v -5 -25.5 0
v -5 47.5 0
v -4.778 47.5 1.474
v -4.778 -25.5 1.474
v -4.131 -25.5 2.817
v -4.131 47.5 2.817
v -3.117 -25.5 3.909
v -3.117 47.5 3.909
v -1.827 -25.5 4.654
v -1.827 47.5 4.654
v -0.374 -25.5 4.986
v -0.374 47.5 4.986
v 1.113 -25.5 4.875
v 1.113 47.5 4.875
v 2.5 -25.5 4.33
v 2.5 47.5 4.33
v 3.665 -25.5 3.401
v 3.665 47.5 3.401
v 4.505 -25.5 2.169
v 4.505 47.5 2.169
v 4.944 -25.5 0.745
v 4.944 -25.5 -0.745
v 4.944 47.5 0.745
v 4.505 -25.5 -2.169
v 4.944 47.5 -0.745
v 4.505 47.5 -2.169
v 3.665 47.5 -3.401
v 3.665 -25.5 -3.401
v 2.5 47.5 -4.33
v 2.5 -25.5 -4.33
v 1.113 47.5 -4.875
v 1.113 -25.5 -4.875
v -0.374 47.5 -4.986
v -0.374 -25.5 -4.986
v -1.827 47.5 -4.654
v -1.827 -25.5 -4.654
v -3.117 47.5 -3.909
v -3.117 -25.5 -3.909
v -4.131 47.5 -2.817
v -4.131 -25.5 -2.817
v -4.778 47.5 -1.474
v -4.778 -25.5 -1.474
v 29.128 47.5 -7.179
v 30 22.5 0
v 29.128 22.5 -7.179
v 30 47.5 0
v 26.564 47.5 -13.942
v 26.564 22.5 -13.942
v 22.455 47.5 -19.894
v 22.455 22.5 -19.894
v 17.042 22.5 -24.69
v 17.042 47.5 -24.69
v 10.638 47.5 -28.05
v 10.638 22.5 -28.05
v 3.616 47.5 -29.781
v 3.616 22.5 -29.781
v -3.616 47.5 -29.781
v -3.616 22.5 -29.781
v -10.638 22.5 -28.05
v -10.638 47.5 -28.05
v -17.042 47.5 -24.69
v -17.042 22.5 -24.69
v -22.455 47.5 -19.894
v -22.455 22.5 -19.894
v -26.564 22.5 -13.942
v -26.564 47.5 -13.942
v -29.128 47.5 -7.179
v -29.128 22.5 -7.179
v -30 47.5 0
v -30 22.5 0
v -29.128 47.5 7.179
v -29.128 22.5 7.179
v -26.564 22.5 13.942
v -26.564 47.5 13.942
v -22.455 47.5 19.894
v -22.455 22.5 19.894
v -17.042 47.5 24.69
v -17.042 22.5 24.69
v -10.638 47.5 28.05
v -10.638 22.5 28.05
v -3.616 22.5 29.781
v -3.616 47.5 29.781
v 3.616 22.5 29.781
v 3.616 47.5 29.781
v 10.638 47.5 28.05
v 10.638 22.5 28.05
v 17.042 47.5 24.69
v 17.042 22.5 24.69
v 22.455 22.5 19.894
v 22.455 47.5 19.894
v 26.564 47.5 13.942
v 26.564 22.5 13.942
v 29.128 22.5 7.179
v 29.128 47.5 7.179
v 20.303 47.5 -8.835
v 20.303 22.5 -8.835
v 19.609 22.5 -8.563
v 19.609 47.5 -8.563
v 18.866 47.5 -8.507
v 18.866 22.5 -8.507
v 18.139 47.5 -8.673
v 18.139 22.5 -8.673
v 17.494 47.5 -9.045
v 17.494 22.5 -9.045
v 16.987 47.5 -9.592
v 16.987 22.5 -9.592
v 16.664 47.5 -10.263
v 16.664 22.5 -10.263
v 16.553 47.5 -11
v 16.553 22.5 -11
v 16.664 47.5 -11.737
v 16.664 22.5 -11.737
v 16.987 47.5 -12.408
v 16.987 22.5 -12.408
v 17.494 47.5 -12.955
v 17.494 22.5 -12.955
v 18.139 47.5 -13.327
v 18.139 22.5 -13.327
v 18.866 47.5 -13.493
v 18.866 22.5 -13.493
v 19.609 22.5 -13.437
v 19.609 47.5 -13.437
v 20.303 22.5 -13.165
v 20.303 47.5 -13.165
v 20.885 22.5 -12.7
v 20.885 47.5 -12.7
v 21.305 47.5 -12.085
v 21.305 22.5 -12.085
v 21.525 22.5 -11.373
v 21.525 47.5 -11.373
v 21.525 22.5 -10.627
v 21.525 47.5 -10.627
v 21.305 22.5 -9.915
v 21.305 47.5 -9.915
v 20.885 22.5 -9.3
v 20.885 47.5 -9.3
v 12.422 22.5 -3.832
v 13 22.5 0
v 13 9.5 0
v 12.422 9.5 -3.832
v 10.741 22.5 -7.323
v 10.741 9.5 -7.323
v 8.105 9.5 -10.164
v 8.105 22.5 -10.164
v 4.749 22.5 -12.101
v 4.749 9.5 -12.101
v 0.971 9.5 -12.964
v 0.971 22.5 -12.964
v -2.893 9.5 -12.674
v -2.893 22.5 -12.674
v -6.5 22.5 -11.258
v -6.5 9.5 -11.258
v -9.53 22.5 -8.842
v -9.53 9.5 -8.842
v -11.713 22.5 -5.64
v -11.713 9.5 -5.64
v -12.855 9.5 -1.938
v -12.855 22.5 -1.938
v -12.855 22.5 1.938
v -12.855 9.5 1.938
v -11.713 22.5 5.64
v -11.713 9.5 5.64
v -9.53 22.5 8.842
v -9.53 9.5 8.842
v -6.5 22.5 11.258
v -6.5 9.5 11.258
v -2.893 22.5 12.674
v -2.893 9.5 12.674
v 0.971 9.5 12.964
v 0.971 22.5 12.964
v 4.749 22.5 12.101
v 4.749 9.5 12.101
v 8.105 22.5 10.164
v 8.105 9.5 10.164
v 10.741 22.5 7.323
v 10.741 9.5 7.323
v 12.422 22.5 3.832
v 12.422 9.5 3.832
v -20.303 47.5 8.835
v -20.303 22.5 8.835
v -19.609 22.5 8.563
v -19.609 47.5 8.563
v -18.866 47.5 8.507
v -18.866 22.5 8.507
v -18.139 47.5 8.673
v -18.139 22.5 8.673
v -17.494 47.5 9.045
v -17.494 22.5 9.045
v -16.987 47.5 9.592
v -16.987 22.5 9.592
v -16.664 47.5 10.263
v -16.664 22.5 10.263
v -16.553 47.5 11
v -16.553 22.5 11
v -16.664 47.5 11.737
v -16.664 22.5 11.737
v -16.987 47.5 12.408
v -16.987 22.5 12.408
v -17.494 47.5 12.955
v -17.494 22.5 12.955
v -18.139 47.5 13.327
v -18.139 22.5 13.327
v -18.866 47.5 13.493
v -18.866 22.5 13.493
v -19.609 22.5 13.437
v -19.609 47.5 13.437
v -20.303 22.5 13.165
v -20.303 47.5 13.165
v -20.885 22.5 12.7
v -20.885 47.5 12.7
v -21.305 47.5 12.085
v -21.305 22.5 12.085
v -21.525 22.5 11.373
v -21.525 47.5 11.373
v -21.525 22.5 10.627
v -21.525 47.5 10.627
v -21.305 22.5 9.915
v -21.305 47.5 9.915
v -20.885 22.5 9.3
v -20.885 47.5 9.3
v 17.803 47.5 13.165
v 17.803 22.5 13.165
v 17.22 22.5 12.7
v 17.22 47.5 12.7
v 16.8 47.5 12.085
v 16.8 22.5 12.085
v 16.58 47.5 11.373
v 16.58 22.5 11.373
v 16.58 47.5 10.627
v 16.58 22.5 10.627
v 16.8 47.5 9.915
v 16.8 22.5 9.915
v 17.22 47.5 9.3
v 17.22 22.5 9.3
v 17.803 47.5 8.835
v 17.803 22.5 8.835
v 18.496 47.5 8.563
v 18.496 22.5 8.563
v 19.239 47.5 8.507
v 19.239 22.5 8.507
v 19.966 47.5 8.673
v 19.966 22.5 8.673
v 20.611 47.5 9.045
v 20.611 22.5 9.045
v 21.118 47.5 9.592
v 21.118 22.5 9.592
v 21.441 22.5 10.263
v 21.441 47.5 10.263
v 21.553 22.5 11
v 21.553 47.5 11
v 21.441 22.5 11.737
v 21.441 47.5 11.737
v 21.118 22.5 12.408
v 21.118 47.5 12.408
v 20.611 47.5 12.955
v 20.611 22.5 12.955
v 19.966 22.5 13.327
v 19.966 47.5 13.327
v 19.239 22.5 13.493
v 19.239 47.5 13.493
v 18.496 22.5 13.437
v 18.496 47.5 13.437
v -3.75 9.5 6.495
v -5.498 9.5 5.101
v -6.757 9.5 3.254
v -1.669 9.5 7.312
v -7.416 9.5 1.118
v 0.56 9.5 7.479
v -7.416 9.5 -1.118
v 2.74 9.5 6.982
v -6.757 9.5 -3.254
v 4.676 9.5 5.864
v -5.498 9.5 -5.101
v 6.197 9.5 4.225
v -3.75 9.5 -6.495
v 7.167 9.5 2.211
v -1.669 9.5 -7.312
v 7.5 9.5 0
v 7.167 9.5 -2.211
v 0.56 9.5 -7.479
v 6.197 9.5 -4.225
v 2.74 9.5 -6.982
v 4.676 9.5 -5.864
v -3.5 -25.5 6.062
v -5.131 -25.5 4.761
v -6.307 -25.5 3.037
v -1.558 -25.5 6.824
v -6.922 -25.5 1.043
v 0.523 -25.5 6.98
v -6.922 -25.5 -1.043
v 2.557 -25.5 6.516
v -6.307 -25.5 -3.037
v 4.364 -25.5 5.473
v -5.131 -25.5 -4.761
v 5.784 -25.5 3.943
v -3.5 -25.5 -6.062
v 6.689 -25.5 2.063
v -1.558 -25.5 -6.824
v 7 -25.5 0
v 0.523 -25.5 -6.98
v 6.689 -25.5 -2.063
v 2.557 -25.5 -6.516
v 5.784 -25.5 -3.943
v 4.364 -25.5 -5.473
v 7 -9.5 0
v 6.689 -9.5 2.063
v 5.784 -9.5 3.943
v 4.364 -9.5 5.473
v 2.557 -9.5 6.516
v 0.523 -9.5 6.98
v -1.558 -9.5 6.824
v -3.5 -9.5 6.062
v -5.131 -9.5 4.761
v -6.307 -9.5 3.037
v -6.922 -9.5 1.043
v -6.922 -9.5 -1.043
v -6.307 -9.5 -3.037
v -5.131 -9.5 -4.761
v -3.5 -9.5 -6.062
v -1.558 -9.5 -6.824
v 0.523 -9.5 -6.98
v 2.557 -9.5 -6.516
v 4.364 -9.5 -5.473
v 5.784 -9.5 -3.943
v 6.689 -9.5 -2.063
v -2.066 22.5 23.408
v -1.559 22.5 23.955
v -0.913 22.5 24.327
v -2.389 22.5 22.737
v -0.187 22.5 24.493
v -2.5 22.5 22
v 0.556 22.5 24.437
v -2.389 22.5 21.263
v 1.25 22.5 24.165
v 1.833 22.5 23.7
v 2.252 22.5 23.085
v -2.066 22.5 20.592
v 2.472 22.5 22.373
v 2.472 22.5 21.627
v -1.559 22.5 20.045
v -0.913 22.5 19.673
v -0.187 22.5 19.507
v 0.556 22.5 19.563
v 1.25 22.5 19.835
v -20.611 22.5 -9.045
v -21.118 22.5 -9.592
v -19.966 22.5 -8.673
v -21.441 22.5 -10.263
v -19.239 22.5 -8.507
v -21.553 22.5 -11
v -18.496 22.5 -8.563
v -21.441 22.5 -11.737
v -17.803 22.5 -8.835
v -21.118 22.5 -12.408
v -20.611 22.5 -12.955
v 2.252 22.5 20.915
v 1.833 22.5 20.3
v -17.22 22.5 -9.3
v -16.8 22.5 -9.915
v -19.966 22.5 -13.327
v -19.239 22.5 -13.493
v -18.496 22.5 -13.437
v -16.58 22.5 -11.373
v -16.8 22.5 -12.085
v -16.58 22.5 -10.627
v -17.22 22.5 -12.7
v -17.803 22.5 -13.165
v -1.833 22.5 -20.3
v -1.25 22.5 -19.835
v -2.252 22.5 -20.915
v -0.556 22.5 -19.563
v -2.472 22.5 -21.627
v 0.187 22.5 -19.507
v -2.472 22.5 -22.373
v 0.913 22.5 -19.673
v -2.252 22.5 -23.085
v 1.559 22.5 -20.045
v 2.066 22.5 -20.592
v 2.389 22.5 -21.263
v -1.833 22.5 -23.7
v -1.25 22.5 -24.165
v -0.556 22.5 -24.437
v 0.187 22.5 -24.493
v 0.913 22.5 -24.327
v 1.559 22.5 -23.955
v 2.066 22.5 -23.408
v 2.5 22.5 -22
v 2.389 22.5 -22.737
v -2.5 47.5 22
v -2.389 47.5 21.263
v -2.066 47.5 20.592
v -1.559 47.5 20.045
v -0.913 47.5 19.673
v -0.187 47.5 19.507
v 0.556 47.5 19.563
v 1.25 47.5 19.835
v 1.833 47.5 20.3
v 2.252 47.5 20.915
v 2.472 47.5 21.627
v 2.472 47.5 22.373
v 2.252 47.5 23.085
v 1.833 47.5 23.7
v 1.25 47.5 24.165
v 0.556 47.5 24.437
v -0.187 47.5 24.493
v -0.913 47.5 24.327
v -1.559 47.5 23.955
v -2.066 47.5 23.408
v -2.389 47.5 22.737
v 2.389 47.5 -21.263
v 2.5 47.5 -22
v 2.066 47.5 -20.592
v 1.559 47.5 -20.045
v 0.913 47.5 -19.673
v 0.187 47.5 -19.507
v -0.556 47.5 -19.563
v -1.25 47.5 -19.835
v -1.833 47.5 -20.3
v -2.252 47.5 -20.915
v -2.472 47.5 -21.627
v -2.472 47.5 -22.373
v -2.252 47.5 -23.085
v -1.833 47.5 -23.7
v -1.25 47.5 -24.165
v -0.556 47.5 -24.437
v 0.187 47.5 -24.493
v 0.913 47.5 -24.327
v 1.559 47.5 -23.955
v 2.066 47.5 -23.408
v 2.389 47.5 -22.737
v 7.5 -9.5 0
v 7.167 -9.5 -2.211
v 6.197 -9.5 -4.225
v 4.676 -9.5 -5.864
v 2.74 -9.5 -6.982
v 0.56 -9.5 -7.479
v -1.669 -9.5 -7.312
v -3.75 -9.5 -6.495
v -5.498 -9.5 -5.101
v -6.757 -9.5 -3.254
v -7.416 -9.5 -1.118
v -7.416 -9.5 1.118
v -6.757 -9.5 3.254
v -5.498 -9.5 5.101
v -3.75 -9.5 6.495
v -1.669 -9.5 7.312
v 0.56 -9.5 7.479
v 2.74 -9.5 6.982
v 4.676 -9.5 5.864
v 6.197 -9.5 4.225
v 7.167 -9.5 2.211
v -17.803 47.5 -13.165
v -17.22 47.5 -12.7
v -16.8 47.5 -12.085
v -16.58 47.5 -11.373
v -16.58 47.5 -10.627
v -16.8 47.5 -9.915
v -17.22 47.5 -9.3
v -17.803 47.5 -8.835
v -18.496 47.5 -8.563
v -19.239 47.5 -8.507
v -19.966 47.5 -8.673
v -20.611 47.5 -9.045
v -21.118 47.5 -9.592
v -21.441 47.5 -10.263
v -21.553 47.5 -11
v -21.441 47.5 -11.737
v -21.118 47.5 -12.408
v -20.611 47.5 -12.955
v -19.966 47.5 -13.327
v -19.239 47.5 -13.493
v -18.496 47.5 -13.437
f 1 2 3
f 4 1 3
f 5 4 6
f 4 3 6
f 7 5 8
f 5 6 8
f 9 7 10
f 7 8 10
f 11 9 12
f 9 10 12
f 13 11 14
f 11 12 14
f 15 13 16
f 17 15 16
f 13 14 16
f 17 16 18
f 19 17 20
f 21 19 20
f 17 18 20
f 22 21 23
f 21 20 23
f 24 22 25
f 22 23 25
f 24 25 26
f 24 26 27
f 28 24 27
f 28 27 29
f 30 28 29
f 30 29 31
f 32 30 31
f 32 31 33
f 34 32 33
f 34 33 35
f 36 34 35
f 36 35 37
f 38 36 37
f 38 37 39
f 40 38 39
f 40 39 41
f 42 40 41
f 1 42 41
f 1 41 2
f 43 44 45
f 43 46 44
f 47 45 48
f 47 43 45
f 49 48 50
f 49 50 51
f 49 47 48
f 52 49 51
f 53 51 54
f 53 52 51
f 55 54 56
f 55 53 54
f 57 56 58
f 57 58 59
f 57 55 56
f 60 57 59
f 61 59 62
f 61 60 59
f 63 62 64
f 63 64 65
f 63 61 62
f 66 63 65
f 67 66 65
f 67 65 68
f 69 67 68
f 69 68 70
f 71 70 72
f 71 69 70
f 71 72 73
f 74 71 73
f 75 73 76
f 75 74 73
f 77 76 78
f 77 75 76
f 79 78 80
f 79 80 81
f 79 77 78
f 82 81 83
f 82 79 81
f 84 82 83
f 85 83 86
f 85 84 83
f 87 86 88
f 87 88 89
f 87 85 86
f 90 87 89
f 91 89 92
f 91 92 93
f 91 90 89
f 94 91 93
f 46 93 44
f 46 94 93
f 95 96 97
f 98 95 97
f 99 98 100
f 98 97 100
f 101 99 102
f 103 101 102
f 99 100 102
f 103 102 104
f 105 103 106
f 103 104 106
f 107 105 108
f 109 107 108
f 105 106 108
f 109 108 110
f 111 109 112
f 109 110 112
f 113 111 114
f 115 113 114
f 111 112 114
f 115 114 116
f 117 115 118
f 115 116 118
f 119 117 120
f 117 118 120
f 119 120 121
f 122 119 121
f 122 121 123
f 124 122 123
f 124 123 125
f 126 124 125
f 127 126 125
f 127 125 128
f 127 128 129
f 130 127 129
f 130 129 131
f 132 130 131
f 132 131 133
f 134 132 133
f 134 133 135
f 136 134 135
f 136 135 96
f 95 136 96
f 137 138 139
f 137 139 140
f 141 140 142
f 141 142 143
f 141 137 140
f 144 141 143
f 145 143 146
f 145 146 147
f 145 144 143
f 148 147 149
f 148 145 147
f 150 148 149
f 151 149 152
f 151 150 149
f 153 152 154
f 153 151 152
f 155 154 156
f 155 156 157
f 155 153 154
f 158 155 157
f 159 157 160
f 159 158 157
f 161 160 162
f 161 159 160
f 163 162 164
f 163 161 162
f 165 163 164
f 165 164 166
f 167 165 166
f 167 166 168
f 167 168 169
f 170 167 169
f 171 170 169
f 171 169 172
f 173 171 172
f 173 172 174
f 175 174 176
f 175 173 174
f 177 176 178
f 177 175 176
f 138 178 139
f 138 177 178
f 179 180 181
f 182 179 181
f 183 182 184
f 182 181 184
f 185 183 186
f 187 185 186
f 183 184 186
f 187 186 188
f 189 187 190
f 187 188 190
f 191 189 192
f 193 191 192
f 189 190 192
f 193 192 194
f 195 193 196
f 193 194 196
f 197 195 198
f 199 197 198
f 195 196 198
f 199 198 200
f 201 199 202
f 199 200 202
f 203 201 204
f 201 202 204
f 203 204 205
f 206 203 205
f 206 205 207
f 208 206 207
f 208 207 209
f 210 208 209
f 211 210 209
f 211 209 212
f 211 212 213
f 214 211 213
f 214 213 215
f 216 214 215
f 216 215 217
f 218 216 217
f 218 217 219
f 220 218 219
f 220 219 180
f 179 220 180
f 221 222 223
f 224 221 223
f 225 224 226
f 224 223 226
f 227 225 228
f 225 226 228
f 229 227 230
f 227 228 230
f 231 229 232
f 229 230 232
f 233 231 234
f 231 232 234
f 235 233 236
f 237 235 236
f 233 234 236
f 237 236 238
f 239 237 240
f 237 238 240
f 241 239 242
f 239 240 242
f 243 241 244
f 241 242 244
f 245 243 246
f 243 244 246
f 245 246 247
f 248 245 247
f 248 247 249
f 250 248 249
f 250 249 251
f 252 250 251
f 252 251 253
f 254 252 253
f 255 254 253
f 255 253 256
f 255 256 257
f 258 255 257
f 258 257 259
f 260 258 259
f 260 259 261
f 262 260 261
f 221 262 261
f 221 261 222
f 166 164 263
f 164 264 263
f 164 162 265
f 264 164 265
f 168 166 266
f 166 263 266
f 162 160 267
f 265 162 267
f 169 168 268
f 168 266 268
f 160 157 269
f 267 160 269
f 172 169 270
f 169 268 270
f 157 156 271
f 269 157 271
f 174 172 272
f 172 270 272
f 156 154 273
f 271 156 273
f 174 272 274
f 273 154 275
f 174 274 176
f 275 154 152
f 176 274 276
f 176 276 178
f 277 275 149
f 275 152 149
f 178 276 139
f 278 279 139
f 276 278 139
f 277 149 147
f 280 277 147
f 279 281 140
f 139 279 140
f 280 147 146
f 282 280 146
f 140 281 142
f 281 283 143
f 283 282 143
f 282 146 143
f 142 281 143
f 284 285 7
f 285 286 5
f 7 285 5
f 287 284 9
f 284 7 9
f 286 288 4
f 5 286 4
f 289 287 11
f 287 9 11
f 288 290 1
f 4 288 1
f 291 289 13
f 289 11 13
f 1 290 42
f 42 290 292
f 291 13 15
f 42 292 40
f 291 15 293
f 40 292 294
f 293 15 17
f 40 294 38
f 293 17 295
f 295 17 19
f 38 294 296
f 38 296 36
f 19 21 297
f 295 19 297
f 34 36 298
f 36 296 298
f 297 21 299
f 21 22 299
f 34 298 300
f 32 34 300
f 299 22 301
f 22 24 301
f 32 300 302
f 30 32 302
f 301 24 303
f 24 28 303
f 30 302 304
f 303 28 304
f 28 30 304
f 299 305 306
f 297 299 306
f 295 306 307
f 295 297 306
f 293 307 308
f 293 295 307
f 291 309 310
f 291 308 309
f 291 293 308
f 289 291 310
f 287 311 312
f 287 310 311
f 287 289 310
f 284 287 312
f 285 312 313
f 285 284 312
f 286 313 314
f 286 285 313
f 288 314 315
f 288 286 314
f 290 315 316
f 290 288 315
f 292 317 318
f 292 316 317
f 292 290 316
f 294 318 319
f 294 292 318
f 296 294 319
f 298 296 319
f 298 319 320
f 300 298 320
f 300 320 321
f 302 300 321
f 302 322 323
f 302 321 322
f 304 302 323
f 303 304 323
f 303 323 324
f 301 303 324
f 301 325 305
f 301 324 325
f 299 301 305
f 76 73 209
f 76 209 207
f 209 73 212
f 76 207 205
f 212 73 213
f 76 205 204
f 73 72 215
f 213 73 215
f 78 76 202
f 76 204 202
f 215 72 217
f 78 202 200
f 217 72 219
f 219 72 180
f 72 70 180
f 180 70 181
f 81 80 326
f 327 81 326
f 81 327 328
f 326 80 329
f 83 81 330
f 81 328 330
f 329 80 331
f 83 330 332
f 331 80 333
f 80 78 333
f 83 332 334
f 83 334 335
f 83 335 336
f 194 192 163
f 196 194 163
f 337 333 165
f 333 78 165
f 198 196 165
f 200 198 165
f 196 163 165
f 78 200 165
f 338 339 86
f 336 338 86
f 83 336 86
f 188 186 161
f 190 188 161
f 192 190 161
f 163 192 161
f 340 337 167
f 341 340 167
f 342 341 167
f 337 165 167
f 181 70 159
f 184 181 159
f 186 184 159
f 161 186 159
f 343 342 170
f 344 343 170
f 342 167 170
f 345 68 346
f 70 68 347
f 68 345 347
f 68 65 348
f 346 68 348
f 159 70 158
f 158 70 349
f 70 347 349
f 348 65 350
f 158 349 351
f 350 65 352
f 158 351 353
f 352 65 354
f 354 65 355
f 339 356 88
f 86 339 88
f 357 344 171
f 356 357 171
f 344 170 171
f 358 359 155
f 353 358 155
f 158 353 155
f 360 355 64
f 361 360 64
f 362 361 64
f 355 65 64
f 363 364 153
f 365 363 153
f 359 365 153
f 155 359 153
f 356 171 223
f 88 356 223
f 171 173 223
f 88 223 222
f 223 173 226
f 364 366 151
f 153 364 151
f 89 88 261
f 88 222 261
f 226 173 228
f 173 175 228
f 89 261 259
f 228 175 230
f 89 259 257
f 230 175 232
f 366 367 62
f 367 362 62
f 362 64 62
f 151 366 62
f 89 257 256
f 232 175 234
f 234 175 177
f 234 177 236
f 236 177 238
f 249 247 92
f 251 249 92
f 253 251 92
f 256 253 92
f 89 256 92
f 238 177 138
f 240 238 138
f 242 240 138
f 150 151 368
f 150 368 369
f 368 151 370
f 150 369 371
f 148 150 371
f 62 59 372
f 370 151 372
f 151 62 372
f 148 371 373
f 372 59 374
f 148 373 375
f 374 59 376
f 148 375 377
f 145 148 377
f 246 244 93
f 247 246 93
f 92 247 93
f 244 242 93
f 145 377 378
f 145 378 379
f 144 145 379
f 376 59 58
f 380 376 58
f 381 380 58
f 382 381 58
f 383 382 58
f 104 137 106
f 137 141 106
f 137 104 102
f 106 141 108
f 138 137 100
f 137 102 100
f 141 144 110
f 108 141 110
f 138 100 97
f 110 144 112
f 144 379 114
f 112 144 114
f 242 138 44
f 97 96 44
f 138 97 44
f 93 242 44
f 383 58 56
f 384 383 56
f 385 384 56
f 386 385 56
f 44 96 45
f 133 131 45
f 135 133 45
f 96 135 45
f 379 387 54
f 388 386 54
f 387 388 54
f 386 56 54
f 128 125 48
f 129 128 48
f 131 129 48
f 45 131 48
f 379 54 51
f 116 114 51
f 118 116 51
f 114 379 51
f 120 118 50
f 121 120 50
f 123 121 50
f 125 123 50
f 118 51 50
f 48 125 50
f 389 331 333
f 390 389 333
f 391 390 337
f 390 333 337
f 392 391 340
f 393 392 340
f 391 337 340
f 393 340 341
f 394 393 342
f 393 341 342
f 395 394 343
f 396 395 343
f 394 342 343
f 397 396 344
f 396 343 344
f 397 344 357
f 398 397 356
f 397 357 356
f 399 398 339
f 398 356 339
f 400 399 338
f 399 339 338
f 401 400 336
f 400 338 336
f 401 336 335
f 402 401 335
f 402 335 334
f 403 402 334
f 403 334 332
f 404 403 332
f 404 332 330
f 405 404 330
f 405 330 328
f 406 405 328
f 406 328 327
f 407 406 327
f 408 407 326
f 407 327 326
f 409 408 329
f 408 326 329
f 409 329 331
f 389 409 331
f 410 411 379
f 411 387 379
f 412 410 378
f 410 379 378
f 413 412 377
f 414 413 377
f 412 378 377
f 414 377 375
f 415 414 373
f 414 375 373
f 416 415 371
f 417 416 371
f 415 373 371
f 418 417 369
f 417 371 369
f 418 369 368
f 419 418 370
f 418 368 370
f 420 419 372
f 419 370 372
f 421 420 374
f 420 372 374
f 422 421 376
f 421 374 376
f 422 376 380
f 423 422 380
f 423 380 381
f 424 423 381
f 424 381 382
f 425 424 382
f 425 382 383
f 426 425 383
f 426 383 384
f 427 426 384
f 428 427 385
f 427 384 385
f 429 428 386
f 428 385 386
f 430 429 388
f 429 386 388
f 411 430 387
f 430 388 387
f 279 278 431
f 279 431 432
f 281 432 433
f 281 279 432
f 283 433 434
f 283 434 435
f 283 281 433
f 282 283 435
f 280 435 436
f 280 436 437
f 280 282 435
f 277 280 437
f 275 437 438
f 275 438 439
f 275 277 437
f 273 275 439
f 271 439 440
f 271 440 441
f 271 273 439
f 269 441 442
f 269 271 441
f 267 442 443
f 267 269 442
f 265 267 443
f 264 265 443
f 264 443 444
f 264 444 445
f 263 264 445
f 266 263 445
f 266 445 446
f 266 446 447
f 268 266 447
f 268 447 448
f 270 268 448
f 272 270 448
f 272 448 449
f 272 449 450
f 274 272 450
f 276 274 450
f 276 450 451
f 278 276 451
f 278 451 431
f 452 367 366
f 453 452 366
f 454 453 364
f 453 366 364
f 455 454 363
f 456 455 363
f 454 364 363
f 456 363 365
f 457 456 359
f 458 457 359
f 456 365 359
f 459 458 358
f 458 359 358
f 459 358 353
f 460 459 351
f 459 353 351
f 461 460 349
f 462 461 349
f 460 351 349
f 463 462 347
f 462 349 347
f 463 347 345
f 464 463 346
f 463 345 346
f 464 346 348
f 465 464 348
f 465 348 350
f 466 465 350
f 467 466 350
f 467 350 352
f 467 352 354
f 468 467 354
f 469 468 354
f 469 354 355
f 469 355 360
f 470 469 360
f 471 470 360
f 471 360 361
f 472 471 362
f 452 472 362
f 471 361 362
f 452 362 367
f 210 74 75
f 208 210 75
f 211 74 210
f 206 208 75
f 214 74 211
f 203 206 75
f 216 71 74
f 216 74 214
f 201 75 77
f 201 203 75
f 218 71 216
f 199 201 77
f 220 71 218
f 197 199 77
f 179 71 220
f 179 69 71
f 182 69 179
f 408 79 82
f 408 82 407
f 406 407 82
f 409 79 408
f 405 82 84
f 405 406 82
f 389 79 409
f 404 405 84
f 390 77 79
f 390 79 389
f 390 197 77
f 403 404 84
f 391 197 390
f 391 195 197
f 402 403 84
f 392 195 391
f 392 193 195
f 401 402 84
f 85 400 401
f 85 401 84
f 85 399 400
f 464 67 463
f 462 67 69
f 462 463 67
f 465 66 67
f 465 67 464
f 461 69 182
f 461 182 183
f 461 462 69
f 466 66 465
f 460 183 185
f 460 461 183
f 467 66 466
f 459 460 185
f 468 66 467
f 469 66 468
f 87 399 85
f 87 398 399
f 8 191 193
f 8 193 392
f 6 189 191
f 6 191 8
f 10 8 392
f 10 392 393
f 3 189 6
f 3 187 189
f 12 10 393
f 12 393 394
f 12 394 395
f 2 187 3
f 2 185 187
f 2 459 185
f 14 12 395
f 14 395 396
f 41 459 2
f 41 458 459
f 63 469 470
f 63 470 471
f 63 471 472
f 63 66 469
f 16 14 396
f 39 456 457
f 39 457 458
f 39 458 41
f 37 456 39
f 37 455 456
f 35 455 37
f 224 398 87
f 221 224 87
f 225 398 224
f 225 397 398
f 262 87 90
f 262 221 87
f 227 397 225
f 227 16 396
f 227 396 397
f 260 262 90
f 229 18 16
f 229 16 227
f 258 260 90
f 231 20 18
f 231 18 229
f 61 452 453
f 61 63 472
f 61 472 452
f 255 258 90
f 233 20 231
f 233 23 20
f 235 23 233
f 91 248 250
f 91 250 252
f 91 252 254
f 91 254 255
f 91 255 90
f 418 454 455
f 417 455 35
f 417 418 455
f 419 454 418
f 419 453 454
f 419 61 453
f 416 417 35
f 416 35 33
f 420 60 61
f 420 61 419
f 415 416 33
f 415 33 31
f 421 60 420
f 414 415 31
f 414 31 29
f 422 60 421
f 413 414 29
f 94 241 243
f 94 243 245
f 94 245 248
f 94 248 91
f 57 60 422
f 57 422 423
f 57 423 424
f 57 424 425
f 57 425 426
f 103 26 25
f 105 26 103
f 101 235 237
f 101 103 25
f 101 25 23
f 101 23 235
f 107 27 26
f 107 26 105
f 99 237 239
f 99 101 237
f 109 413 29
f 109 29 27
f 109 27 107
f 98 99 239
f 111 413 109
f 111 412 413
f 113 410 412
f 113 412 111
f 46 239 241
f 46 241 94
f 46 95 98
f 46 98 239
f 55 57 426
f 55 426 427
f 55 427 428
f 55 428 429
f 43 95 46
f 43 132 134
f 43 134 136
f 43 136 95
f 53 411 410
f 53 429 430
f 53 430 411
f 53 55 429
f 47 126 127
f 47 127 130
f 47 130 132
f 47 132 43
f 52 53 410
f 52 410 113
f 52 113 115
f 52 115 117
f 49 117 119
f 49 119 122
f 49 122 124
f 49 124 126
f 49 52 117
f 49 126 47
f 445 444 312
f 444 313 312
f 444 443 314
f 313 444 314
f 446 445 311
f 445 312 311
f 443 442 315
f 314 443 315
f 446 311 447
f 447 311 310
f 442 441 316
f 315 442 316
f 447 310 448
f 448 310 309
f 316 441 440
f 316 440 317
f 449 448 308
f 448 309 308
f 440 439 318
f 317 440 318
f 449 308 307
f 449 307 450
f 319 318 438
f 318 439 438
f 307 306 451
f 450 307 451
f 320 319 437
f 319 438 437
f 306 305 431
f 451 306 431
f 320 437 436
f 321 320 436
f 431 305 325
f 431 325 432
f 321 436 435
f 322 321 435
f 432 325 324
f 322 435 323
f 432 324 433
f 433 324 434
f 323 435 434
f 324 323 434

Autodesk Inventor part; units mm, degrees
ref_plane "YZ Plane" through (0, 0, 0) normal (1, 0, 0) x (0, 1, 0)
ref_plane "XZ Plane" through (0, 0, 0) normal (0, 1, 0) x (-1, 0, 0)
ref_plane "XY Plane" through (0, 0, 0) normal (0, 0, 1) x (1, 0, 0)
sketch "esq_rev" plane through (0, 0, 0) normal (0, 0, 1) x (1, 0, 0)
  line L0 (0, -40.1) -> (0, 62.1) projected
  line L1 (7.5, -9.5) -> (7.5, 9.5)
  line L2 (7.5, 9.5) -> (13, 9.5)
  line L3 (13, 9.5) -> (13, 22.5)
  line L4 (13, 22.5) -> (30, 22.5)
  line L5 (30, 22.5) -> (30, 47.5)
  line L6 (30, 47.5) -> (0, 47.5)
  line L7 (0, -25.5) -> (0, -0.0006)
  line L8 (-38.091, 0) -> (41.3485, 0) projected
  line L9 (-26.7425, 30) -> (-5.3911, 30) projected
  line L10 (-5.3911, 30) -> (28.4337, 30) projected
  line L11 (28.4337, 30) -> (7.0823, 30) projected
  line L12 (7.0823, 30) -> (-26.7425, 30) projected
  line L13 (-6.854, 30) -> (-23.5883, 30) projected
  line L14 (-23.5883, 30) -> (-14.3845, 30) projected
  line L15 (-4.5388, 30) -> (-6.854, 30) projected
  line L16 (-24.4454, 30) -> (5.2291, 30) projected
  line L17 (5.2291, 30) -> (2.6006, 30) projected
  line L18 (-13.9964, 30) -> (-24.4454, 30) projected
  line L19 (24.4454, 30) -> (-5.2291, 30) projected
  line L20 (-5.2291, 30) -> (-2.6006, 30) projected
  line L21 (13.9964, 30) -> (24.4454, 30) projected
  line L22 (4.5388, 30) -> (7.194, 30) projected
  line L23 (7.194, 30) -> (24.9396, 30) projected
  line L24 (24.9396, 30) -> (14.3845, 30) projected
  line L25 (-4.5388, 30) -> (-14.5, 30) projected
  line L26 (2.6006, 30) -> (-13.9964, 30) projected
  line L27 (13.9964, 30) -> (-2.6006, 30) projected
  line L28 (14.5, 30) -> (4.5388, 30) projected
  line L29 (-12.5, 30) -> (12.5, 30) projected
  line L30 (-12.5, -20) -> (12.5, -20) projected
  line L31 (7, -9.5) -> (7, -25.5)
  line L32 (7, -25.5) -> (0, -25.5)
  line L33 (7, -9.5) -> (7.5, -9.5)
  line L34 (0, -0.0006) -> (0, 47.5)
  point P0 (0, 0)
  dimension "d0" = 30
  dimension "d1" = 13
  dimension "d2" = 7.5
  dimension "d5" = 13
  dimension "d6" = 25
  dimension "d23" = 7
  dimension "d25" = 19
  dimension "d26" = 16
revolve "rev" add sketch "esq_rev" angle 360 about axis through (0, -25.5, 0) along (0, 1, 0)
sketch "esq_percage" plane through (0, 0, 0) normal (0, 1, 0) x (-1, 0, 0)
  line L0 (0, -7) -> (0, 7) projected
  line L1 (-7, 0) -> (7, 0) projected
  circle A0 centre (0, 0) radius 5
  dimension "d8" = 10
extrude "ext_percage" cut sketch "esq_percage" along normal through all both and the other way through all
sketch "Esq_trous" plane through (0, 0, 0) normal (0, 1, 0) x (-1, 0, 0)
  line L0 (0, -4.9) -> (0, 29.4) projected
  line L1 (-3.5, 0) -> (3.5, 0) projected
  circle A0 centre (0, 22) radius 2.5
  point P0 (0, 0)
  dimension "d11" = 5
  dimension "d12" = 22
extrude "ext_trous" cut sketch "Esq_trous" along normal through all
pattern_circular "Réseau circulaire1" count 6 over 360 about axis through (0, -10, 0) along (0, 1, 0) of "ext_trous"
thread "Filetage2" size "M14x2" class "6g" standard "ANSI Metric M Profile" full length
properties part number "wheel_hub_spacer" material "Aluminium 6061"
